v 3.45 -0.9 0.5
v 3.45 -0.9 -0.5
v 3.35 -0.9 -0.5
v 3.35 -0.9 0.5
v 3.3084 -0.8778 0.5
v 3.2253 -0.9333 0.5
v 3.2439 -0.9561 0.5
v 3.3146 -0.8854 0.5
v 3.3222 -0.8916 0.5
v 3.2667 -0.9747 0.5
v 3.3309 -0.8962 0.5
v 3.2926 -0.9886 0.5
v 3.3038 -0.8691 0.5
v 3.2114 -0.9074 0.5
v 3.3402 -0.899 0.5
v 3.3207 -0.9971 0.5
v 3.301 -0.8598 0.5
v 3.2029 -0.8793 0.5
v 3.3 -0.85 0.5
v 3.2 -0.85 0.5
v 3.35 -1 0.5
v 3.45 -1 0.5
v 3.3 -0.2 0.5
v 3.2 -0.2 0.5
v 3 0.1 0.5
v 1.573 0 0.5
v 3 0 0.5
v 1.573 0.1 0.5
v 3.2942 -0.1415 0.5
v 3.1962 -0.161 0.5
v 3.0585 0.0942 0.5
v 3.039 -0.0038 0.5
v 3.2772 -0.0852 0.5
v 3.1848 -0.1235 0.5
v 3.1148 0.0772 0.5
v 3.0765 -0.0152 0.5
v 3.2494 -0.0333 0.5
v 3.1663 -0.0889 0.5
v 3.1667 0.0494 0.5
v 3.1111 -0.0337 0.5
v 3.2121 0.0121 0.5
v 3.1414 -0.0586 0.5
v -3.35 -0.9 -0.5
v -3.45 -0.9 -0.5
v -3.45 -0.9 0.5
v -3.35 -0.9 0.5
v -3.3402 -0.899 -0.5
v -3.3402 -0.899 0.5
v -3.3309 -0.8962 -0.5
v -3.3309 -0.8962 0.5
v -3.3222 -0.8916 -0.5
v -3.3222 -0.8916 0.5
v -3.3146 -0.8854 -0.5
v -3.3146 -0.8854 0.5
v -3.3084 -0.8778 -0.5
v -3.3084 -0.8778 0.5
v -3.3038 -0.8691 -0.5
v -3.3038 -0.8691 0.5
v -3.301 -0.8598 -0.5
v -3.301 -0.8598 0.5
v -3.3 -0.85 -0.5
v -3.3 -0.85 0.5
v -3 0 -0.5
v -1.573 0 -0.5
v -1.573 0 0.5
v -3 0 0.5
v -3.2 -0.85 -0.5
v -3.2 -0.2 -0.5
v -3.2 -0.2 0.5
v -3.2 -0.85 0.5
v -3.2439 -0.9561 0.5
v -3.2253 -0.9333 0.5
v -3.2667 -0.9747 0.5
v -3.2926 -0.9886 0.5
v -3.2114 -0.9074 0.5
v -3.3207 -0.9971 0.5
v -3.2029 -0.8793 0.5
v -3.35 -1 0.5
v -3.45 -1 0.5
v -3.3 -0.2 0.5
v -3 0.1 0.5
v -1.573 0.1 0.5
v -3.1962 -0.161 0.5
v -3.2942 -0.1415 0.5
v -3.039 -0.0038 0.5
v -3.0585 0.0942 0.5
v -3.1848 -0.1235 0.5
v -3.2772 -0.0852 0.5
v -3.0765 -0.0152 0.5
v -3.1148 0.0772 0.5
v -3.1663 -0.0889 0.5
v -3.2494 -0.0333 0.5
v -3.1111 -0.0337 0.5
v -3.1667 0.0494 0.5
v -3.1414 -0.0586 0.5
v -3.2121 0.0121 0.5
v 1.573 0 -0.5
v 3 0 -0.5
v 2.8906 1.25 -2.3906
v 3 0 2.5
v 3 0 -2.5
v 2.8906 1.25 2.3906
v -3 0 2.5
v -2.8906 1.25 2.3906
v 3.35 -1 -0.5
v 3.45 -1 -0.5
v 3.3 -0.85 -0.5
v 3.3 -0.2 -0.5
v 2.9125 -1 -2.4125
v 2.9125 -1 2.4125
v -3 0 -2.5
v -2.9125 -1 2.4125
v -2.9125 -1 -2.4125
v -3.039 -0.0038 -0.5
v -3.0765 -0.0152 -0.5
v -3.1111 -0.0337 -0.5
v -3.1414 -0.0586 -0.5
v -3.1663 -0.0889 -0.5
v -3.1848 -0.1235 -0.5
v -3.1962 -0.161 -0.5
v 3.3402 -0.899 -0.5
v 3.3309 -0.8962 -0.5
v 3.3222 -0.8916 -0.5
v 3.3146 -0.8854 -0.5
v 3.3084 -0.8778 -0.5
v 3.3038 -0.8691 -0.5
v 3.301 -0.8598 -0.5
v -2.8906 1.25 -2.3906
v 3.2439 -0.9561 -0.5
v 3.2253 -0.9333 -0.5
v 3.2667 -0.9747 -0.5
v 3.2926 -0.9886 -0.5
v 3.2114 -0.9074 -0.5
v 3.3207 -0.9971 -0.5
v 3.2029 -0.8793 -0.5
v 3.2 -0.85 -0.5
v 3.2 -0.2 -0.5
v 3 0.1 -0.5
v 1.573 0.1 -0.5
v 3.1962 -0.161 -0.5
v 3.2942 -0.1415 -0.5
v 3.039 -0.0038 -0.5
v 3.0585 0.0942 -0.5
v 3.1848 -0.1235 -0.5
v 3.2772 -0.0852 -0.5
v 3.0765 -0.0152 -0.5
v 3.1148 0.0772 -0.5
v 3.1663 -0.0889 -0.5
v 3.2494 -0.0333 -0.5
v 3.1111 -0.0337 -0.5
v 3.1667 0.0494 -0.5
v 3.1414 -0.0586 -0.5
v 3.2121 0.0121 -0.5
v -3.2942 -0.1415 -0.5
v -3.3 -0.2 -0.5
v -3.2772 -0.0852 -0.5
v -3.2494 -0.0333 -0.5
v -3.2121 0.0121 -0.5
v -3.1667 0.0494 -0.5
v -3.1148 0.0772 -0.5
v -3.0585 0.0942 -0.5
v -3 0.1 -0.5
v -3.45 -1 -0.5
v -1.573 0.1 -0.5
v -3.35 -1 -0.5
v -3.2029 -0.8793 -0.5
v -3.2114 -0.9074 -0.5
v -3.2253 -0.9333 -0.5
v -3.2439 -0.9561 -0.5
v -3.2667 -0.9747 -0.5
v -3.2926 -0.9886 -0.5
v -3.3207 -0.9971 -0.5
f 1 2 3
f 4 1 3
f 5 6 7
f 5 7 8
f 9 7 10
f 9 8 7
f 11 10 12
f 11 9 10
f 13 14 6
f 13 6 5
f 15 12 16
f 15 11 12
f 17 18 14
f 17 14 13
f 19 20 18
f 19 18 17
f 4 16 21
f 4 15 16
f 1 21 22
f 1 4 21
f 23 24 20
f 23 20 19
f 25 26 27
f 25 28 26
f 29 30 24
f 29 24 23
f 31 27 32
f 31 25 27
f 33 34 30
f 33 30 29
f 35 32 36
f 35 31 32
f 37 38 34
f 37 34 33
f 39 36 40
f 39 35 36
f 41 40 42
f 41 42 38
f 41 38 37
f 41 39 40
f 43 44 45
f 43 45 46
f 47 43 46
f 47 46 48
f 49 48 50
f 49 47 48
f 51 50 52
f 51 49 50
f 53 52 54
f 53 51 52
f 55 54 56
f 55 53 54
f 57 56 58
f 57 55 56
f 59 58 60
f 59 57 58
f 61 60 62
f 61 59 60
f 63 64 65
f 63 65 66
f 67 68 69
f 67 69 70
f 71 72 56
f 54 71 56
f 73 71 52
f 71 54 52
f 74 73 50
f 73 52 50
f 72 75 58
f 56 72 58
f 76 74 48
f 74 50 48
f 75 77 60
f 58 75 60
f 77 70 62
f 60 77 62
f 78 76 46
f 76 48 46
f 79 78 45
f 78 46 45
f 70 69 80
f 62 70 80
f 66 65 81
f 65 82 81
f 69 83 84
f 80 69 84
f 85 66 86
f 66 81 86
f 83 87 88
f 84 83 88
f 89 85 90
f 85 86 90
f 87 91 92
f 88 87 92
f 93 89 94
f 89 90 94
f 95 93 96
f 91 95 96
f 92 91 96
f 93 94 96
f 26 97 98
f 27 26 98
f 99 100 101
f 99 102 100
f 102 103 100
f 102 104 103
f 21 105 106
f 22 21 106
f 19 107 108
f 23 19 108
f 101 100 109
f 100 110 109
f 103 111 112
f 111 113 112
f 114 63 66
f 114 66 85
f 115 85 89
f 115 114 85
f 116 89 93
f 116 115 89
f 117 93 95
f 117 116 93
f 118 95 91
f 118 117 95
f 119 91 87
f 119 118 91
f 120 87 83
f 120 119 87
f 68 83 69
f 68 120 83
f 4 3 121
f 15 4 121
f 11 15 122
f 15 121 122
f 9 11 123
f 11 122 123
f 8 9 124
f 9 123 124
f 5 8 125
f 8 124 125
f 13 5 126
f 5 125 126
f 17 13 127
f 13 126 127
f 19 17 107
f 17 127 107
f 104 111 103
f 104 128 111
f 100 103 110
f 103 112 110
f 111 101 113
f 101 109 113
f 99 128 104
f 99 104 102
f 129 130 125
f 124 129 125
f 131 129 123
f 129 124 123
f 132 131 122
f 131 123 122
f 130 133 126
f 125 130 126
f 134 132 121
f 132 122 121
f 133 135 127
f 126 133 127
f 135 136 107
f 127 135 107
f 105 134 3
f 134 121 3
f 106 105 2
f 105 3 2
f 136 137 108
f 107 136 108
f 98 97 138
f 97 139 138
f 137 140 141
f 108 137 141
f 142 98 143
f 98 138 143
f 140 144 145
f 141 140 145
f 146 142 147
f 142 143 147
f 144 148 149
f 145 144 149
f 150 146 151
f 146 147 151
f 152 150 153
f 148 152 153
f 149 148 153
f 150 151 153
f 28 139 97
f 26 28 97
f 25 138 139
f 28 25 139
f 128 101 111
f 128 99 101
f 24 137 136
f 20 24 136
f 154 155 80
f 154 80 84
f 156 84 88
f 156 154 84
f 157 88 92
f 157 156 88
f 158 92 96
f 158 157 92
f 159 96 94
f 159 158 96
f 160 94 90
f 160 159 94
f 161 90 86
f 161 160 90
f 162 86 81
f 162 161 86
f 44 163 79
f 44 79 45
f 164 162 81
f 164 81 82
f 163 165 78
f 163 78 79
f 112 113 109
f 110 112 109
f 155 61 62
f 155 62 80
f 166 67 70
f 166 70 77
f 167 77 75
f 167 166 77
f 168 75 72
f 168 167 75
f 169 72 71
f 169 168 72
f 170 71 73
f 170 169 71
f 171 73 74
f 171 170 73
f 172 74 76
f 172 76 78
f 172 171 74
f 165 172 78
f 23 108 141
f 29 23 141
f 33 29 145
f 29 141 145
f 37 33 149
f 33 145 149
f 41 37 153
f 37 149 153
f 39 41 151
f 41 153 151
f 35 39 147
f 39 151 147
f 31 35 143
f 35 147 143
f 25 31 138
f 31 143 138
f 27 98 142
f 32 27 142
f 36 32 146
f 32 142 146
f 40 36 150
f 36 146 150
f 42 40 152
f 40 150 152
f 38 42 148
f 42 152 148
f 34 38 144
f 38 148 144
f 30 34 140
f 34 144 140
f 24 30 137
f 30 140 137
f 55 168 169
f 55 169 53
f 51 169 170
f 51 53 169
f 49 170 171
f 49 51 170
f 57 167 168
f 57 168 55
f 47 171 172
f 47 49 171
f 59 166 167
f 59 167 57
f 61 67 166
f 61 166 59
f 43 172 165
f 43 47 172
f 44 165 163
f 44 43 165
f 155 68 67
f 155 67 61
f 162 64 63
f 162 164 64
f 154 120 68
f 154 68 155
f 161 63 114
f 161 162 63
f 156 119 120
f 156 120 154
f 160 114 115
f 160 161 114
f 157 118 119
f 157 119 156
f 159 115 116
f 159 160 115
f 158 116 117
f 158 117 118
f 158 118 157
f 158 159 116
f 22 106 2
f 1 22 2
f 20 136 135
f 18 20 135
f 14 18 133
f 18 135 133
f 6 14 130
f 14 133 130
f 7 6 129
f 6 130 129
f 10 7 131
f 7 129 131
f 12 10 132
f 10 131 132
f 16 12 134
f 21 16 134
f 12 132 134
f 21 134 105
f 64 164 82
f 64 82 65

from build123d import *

# Parameters (mm, degrees)
SKETCH1_W                     = 6
SKETCH1_H                     = 5
BOSS_EXTRUDE1_DEPTH           = 1.25
BOSS_EXTRUDE1_TAPER           = 5
BOSS_EXTRUDE1_OTHER_WAY_DEPTH = 1
BOSS_EXTRUDE1_OTHER_WAY_TAPER = 5
EXTRUDE_THIN1_DEPTH           = 0.5
EXTRUDE_THIN1_DEPTH_BACK      = 0.5


with BuildPart() as part:
    # Sketch1 → Boss-Extrude1 (new body)
    with BuildSketch(Plane(origin=(0, 0, 0), x_dir=(1, 0, 0), z_dir=(0, 1, 0))):
        Rectangle(SKETCH1_W, SKETCH1_H)
    extrude(amount=BOSS_EXTRUDE1_DEPTH, taper=BOSS_EXTRUDE1_TAPER)

    # Sketch1 → Boss-Extrude1 other way (add)
    with BuildSketch(Plane(origin=(0, 0, 0), x_dir=(1, 0, 0), z_dir=(0, 1, 0))):
        Rectangle(SKETCH1_W, SKETCH1_H)
    extrude(amount=-BOSS_EXTRUDE1_OTHER_WAY_DEPTH, taper=BOSS_EXTRUDE1_OTHER_WAY_TAPER)


with BuildPart() as body_2:
    # Sketch2 → Extrude-Thin1 (new, two sides: drawn at the far end of the back side and taken through both)
    with BuildSketch(Plane.XY.offset(-EXTRUDE_THIN1_DEPTH_BACK)):
        with BuildLine():
            Line((-1.573017802, 0), (-3, 0))
            ThreePointArc((-3, 0), (-3.141421356, -0.058578644), (-3.2, -0.2))
            Line((-3.2, -0.2), (-3.2, -0.85))
            ThreePointArc((-3.2, -0.85), (-3.243933983, -0.956066017), (-3.35, -1))
            Line((-3.35, -1), (-3.45, -1))
            Line((-3.45, -1), (-3.45, -0.9))
            Line((-3.45, -0.9), (-3.35, -0.9))
            ThreePointArc((-3.35, -0.9), (-3.314644661, -0.885355339), (-3.3, -0.85))
            Line((-3.3, -0.85), (-3.3, -0.2))
            ThreePointArc((-3.3, -0.2), (-3.212132034, 0.012132034), (-3, 0.1))
            Line((-3, 0.1), (-1.573017802, 0.1))
            Line((-1.573017802, 0.1), (-1.573017802, 0))
        make_face()
    extrude(amount=EXTRUDE_THIN1_DEPTH + EXTRUDE_THIN1_DEPTH_BACK)


with BuildPart() as body_3:
    # Mirror3: mirrored copy
    add(body_2.part.mirror(Plane(origin=(0, 0, 0), x_dir=(0, 0, 1), z_dir=(1, 0, 0))))


solid = Compound([part.part, body_2.part, body_3.part])
